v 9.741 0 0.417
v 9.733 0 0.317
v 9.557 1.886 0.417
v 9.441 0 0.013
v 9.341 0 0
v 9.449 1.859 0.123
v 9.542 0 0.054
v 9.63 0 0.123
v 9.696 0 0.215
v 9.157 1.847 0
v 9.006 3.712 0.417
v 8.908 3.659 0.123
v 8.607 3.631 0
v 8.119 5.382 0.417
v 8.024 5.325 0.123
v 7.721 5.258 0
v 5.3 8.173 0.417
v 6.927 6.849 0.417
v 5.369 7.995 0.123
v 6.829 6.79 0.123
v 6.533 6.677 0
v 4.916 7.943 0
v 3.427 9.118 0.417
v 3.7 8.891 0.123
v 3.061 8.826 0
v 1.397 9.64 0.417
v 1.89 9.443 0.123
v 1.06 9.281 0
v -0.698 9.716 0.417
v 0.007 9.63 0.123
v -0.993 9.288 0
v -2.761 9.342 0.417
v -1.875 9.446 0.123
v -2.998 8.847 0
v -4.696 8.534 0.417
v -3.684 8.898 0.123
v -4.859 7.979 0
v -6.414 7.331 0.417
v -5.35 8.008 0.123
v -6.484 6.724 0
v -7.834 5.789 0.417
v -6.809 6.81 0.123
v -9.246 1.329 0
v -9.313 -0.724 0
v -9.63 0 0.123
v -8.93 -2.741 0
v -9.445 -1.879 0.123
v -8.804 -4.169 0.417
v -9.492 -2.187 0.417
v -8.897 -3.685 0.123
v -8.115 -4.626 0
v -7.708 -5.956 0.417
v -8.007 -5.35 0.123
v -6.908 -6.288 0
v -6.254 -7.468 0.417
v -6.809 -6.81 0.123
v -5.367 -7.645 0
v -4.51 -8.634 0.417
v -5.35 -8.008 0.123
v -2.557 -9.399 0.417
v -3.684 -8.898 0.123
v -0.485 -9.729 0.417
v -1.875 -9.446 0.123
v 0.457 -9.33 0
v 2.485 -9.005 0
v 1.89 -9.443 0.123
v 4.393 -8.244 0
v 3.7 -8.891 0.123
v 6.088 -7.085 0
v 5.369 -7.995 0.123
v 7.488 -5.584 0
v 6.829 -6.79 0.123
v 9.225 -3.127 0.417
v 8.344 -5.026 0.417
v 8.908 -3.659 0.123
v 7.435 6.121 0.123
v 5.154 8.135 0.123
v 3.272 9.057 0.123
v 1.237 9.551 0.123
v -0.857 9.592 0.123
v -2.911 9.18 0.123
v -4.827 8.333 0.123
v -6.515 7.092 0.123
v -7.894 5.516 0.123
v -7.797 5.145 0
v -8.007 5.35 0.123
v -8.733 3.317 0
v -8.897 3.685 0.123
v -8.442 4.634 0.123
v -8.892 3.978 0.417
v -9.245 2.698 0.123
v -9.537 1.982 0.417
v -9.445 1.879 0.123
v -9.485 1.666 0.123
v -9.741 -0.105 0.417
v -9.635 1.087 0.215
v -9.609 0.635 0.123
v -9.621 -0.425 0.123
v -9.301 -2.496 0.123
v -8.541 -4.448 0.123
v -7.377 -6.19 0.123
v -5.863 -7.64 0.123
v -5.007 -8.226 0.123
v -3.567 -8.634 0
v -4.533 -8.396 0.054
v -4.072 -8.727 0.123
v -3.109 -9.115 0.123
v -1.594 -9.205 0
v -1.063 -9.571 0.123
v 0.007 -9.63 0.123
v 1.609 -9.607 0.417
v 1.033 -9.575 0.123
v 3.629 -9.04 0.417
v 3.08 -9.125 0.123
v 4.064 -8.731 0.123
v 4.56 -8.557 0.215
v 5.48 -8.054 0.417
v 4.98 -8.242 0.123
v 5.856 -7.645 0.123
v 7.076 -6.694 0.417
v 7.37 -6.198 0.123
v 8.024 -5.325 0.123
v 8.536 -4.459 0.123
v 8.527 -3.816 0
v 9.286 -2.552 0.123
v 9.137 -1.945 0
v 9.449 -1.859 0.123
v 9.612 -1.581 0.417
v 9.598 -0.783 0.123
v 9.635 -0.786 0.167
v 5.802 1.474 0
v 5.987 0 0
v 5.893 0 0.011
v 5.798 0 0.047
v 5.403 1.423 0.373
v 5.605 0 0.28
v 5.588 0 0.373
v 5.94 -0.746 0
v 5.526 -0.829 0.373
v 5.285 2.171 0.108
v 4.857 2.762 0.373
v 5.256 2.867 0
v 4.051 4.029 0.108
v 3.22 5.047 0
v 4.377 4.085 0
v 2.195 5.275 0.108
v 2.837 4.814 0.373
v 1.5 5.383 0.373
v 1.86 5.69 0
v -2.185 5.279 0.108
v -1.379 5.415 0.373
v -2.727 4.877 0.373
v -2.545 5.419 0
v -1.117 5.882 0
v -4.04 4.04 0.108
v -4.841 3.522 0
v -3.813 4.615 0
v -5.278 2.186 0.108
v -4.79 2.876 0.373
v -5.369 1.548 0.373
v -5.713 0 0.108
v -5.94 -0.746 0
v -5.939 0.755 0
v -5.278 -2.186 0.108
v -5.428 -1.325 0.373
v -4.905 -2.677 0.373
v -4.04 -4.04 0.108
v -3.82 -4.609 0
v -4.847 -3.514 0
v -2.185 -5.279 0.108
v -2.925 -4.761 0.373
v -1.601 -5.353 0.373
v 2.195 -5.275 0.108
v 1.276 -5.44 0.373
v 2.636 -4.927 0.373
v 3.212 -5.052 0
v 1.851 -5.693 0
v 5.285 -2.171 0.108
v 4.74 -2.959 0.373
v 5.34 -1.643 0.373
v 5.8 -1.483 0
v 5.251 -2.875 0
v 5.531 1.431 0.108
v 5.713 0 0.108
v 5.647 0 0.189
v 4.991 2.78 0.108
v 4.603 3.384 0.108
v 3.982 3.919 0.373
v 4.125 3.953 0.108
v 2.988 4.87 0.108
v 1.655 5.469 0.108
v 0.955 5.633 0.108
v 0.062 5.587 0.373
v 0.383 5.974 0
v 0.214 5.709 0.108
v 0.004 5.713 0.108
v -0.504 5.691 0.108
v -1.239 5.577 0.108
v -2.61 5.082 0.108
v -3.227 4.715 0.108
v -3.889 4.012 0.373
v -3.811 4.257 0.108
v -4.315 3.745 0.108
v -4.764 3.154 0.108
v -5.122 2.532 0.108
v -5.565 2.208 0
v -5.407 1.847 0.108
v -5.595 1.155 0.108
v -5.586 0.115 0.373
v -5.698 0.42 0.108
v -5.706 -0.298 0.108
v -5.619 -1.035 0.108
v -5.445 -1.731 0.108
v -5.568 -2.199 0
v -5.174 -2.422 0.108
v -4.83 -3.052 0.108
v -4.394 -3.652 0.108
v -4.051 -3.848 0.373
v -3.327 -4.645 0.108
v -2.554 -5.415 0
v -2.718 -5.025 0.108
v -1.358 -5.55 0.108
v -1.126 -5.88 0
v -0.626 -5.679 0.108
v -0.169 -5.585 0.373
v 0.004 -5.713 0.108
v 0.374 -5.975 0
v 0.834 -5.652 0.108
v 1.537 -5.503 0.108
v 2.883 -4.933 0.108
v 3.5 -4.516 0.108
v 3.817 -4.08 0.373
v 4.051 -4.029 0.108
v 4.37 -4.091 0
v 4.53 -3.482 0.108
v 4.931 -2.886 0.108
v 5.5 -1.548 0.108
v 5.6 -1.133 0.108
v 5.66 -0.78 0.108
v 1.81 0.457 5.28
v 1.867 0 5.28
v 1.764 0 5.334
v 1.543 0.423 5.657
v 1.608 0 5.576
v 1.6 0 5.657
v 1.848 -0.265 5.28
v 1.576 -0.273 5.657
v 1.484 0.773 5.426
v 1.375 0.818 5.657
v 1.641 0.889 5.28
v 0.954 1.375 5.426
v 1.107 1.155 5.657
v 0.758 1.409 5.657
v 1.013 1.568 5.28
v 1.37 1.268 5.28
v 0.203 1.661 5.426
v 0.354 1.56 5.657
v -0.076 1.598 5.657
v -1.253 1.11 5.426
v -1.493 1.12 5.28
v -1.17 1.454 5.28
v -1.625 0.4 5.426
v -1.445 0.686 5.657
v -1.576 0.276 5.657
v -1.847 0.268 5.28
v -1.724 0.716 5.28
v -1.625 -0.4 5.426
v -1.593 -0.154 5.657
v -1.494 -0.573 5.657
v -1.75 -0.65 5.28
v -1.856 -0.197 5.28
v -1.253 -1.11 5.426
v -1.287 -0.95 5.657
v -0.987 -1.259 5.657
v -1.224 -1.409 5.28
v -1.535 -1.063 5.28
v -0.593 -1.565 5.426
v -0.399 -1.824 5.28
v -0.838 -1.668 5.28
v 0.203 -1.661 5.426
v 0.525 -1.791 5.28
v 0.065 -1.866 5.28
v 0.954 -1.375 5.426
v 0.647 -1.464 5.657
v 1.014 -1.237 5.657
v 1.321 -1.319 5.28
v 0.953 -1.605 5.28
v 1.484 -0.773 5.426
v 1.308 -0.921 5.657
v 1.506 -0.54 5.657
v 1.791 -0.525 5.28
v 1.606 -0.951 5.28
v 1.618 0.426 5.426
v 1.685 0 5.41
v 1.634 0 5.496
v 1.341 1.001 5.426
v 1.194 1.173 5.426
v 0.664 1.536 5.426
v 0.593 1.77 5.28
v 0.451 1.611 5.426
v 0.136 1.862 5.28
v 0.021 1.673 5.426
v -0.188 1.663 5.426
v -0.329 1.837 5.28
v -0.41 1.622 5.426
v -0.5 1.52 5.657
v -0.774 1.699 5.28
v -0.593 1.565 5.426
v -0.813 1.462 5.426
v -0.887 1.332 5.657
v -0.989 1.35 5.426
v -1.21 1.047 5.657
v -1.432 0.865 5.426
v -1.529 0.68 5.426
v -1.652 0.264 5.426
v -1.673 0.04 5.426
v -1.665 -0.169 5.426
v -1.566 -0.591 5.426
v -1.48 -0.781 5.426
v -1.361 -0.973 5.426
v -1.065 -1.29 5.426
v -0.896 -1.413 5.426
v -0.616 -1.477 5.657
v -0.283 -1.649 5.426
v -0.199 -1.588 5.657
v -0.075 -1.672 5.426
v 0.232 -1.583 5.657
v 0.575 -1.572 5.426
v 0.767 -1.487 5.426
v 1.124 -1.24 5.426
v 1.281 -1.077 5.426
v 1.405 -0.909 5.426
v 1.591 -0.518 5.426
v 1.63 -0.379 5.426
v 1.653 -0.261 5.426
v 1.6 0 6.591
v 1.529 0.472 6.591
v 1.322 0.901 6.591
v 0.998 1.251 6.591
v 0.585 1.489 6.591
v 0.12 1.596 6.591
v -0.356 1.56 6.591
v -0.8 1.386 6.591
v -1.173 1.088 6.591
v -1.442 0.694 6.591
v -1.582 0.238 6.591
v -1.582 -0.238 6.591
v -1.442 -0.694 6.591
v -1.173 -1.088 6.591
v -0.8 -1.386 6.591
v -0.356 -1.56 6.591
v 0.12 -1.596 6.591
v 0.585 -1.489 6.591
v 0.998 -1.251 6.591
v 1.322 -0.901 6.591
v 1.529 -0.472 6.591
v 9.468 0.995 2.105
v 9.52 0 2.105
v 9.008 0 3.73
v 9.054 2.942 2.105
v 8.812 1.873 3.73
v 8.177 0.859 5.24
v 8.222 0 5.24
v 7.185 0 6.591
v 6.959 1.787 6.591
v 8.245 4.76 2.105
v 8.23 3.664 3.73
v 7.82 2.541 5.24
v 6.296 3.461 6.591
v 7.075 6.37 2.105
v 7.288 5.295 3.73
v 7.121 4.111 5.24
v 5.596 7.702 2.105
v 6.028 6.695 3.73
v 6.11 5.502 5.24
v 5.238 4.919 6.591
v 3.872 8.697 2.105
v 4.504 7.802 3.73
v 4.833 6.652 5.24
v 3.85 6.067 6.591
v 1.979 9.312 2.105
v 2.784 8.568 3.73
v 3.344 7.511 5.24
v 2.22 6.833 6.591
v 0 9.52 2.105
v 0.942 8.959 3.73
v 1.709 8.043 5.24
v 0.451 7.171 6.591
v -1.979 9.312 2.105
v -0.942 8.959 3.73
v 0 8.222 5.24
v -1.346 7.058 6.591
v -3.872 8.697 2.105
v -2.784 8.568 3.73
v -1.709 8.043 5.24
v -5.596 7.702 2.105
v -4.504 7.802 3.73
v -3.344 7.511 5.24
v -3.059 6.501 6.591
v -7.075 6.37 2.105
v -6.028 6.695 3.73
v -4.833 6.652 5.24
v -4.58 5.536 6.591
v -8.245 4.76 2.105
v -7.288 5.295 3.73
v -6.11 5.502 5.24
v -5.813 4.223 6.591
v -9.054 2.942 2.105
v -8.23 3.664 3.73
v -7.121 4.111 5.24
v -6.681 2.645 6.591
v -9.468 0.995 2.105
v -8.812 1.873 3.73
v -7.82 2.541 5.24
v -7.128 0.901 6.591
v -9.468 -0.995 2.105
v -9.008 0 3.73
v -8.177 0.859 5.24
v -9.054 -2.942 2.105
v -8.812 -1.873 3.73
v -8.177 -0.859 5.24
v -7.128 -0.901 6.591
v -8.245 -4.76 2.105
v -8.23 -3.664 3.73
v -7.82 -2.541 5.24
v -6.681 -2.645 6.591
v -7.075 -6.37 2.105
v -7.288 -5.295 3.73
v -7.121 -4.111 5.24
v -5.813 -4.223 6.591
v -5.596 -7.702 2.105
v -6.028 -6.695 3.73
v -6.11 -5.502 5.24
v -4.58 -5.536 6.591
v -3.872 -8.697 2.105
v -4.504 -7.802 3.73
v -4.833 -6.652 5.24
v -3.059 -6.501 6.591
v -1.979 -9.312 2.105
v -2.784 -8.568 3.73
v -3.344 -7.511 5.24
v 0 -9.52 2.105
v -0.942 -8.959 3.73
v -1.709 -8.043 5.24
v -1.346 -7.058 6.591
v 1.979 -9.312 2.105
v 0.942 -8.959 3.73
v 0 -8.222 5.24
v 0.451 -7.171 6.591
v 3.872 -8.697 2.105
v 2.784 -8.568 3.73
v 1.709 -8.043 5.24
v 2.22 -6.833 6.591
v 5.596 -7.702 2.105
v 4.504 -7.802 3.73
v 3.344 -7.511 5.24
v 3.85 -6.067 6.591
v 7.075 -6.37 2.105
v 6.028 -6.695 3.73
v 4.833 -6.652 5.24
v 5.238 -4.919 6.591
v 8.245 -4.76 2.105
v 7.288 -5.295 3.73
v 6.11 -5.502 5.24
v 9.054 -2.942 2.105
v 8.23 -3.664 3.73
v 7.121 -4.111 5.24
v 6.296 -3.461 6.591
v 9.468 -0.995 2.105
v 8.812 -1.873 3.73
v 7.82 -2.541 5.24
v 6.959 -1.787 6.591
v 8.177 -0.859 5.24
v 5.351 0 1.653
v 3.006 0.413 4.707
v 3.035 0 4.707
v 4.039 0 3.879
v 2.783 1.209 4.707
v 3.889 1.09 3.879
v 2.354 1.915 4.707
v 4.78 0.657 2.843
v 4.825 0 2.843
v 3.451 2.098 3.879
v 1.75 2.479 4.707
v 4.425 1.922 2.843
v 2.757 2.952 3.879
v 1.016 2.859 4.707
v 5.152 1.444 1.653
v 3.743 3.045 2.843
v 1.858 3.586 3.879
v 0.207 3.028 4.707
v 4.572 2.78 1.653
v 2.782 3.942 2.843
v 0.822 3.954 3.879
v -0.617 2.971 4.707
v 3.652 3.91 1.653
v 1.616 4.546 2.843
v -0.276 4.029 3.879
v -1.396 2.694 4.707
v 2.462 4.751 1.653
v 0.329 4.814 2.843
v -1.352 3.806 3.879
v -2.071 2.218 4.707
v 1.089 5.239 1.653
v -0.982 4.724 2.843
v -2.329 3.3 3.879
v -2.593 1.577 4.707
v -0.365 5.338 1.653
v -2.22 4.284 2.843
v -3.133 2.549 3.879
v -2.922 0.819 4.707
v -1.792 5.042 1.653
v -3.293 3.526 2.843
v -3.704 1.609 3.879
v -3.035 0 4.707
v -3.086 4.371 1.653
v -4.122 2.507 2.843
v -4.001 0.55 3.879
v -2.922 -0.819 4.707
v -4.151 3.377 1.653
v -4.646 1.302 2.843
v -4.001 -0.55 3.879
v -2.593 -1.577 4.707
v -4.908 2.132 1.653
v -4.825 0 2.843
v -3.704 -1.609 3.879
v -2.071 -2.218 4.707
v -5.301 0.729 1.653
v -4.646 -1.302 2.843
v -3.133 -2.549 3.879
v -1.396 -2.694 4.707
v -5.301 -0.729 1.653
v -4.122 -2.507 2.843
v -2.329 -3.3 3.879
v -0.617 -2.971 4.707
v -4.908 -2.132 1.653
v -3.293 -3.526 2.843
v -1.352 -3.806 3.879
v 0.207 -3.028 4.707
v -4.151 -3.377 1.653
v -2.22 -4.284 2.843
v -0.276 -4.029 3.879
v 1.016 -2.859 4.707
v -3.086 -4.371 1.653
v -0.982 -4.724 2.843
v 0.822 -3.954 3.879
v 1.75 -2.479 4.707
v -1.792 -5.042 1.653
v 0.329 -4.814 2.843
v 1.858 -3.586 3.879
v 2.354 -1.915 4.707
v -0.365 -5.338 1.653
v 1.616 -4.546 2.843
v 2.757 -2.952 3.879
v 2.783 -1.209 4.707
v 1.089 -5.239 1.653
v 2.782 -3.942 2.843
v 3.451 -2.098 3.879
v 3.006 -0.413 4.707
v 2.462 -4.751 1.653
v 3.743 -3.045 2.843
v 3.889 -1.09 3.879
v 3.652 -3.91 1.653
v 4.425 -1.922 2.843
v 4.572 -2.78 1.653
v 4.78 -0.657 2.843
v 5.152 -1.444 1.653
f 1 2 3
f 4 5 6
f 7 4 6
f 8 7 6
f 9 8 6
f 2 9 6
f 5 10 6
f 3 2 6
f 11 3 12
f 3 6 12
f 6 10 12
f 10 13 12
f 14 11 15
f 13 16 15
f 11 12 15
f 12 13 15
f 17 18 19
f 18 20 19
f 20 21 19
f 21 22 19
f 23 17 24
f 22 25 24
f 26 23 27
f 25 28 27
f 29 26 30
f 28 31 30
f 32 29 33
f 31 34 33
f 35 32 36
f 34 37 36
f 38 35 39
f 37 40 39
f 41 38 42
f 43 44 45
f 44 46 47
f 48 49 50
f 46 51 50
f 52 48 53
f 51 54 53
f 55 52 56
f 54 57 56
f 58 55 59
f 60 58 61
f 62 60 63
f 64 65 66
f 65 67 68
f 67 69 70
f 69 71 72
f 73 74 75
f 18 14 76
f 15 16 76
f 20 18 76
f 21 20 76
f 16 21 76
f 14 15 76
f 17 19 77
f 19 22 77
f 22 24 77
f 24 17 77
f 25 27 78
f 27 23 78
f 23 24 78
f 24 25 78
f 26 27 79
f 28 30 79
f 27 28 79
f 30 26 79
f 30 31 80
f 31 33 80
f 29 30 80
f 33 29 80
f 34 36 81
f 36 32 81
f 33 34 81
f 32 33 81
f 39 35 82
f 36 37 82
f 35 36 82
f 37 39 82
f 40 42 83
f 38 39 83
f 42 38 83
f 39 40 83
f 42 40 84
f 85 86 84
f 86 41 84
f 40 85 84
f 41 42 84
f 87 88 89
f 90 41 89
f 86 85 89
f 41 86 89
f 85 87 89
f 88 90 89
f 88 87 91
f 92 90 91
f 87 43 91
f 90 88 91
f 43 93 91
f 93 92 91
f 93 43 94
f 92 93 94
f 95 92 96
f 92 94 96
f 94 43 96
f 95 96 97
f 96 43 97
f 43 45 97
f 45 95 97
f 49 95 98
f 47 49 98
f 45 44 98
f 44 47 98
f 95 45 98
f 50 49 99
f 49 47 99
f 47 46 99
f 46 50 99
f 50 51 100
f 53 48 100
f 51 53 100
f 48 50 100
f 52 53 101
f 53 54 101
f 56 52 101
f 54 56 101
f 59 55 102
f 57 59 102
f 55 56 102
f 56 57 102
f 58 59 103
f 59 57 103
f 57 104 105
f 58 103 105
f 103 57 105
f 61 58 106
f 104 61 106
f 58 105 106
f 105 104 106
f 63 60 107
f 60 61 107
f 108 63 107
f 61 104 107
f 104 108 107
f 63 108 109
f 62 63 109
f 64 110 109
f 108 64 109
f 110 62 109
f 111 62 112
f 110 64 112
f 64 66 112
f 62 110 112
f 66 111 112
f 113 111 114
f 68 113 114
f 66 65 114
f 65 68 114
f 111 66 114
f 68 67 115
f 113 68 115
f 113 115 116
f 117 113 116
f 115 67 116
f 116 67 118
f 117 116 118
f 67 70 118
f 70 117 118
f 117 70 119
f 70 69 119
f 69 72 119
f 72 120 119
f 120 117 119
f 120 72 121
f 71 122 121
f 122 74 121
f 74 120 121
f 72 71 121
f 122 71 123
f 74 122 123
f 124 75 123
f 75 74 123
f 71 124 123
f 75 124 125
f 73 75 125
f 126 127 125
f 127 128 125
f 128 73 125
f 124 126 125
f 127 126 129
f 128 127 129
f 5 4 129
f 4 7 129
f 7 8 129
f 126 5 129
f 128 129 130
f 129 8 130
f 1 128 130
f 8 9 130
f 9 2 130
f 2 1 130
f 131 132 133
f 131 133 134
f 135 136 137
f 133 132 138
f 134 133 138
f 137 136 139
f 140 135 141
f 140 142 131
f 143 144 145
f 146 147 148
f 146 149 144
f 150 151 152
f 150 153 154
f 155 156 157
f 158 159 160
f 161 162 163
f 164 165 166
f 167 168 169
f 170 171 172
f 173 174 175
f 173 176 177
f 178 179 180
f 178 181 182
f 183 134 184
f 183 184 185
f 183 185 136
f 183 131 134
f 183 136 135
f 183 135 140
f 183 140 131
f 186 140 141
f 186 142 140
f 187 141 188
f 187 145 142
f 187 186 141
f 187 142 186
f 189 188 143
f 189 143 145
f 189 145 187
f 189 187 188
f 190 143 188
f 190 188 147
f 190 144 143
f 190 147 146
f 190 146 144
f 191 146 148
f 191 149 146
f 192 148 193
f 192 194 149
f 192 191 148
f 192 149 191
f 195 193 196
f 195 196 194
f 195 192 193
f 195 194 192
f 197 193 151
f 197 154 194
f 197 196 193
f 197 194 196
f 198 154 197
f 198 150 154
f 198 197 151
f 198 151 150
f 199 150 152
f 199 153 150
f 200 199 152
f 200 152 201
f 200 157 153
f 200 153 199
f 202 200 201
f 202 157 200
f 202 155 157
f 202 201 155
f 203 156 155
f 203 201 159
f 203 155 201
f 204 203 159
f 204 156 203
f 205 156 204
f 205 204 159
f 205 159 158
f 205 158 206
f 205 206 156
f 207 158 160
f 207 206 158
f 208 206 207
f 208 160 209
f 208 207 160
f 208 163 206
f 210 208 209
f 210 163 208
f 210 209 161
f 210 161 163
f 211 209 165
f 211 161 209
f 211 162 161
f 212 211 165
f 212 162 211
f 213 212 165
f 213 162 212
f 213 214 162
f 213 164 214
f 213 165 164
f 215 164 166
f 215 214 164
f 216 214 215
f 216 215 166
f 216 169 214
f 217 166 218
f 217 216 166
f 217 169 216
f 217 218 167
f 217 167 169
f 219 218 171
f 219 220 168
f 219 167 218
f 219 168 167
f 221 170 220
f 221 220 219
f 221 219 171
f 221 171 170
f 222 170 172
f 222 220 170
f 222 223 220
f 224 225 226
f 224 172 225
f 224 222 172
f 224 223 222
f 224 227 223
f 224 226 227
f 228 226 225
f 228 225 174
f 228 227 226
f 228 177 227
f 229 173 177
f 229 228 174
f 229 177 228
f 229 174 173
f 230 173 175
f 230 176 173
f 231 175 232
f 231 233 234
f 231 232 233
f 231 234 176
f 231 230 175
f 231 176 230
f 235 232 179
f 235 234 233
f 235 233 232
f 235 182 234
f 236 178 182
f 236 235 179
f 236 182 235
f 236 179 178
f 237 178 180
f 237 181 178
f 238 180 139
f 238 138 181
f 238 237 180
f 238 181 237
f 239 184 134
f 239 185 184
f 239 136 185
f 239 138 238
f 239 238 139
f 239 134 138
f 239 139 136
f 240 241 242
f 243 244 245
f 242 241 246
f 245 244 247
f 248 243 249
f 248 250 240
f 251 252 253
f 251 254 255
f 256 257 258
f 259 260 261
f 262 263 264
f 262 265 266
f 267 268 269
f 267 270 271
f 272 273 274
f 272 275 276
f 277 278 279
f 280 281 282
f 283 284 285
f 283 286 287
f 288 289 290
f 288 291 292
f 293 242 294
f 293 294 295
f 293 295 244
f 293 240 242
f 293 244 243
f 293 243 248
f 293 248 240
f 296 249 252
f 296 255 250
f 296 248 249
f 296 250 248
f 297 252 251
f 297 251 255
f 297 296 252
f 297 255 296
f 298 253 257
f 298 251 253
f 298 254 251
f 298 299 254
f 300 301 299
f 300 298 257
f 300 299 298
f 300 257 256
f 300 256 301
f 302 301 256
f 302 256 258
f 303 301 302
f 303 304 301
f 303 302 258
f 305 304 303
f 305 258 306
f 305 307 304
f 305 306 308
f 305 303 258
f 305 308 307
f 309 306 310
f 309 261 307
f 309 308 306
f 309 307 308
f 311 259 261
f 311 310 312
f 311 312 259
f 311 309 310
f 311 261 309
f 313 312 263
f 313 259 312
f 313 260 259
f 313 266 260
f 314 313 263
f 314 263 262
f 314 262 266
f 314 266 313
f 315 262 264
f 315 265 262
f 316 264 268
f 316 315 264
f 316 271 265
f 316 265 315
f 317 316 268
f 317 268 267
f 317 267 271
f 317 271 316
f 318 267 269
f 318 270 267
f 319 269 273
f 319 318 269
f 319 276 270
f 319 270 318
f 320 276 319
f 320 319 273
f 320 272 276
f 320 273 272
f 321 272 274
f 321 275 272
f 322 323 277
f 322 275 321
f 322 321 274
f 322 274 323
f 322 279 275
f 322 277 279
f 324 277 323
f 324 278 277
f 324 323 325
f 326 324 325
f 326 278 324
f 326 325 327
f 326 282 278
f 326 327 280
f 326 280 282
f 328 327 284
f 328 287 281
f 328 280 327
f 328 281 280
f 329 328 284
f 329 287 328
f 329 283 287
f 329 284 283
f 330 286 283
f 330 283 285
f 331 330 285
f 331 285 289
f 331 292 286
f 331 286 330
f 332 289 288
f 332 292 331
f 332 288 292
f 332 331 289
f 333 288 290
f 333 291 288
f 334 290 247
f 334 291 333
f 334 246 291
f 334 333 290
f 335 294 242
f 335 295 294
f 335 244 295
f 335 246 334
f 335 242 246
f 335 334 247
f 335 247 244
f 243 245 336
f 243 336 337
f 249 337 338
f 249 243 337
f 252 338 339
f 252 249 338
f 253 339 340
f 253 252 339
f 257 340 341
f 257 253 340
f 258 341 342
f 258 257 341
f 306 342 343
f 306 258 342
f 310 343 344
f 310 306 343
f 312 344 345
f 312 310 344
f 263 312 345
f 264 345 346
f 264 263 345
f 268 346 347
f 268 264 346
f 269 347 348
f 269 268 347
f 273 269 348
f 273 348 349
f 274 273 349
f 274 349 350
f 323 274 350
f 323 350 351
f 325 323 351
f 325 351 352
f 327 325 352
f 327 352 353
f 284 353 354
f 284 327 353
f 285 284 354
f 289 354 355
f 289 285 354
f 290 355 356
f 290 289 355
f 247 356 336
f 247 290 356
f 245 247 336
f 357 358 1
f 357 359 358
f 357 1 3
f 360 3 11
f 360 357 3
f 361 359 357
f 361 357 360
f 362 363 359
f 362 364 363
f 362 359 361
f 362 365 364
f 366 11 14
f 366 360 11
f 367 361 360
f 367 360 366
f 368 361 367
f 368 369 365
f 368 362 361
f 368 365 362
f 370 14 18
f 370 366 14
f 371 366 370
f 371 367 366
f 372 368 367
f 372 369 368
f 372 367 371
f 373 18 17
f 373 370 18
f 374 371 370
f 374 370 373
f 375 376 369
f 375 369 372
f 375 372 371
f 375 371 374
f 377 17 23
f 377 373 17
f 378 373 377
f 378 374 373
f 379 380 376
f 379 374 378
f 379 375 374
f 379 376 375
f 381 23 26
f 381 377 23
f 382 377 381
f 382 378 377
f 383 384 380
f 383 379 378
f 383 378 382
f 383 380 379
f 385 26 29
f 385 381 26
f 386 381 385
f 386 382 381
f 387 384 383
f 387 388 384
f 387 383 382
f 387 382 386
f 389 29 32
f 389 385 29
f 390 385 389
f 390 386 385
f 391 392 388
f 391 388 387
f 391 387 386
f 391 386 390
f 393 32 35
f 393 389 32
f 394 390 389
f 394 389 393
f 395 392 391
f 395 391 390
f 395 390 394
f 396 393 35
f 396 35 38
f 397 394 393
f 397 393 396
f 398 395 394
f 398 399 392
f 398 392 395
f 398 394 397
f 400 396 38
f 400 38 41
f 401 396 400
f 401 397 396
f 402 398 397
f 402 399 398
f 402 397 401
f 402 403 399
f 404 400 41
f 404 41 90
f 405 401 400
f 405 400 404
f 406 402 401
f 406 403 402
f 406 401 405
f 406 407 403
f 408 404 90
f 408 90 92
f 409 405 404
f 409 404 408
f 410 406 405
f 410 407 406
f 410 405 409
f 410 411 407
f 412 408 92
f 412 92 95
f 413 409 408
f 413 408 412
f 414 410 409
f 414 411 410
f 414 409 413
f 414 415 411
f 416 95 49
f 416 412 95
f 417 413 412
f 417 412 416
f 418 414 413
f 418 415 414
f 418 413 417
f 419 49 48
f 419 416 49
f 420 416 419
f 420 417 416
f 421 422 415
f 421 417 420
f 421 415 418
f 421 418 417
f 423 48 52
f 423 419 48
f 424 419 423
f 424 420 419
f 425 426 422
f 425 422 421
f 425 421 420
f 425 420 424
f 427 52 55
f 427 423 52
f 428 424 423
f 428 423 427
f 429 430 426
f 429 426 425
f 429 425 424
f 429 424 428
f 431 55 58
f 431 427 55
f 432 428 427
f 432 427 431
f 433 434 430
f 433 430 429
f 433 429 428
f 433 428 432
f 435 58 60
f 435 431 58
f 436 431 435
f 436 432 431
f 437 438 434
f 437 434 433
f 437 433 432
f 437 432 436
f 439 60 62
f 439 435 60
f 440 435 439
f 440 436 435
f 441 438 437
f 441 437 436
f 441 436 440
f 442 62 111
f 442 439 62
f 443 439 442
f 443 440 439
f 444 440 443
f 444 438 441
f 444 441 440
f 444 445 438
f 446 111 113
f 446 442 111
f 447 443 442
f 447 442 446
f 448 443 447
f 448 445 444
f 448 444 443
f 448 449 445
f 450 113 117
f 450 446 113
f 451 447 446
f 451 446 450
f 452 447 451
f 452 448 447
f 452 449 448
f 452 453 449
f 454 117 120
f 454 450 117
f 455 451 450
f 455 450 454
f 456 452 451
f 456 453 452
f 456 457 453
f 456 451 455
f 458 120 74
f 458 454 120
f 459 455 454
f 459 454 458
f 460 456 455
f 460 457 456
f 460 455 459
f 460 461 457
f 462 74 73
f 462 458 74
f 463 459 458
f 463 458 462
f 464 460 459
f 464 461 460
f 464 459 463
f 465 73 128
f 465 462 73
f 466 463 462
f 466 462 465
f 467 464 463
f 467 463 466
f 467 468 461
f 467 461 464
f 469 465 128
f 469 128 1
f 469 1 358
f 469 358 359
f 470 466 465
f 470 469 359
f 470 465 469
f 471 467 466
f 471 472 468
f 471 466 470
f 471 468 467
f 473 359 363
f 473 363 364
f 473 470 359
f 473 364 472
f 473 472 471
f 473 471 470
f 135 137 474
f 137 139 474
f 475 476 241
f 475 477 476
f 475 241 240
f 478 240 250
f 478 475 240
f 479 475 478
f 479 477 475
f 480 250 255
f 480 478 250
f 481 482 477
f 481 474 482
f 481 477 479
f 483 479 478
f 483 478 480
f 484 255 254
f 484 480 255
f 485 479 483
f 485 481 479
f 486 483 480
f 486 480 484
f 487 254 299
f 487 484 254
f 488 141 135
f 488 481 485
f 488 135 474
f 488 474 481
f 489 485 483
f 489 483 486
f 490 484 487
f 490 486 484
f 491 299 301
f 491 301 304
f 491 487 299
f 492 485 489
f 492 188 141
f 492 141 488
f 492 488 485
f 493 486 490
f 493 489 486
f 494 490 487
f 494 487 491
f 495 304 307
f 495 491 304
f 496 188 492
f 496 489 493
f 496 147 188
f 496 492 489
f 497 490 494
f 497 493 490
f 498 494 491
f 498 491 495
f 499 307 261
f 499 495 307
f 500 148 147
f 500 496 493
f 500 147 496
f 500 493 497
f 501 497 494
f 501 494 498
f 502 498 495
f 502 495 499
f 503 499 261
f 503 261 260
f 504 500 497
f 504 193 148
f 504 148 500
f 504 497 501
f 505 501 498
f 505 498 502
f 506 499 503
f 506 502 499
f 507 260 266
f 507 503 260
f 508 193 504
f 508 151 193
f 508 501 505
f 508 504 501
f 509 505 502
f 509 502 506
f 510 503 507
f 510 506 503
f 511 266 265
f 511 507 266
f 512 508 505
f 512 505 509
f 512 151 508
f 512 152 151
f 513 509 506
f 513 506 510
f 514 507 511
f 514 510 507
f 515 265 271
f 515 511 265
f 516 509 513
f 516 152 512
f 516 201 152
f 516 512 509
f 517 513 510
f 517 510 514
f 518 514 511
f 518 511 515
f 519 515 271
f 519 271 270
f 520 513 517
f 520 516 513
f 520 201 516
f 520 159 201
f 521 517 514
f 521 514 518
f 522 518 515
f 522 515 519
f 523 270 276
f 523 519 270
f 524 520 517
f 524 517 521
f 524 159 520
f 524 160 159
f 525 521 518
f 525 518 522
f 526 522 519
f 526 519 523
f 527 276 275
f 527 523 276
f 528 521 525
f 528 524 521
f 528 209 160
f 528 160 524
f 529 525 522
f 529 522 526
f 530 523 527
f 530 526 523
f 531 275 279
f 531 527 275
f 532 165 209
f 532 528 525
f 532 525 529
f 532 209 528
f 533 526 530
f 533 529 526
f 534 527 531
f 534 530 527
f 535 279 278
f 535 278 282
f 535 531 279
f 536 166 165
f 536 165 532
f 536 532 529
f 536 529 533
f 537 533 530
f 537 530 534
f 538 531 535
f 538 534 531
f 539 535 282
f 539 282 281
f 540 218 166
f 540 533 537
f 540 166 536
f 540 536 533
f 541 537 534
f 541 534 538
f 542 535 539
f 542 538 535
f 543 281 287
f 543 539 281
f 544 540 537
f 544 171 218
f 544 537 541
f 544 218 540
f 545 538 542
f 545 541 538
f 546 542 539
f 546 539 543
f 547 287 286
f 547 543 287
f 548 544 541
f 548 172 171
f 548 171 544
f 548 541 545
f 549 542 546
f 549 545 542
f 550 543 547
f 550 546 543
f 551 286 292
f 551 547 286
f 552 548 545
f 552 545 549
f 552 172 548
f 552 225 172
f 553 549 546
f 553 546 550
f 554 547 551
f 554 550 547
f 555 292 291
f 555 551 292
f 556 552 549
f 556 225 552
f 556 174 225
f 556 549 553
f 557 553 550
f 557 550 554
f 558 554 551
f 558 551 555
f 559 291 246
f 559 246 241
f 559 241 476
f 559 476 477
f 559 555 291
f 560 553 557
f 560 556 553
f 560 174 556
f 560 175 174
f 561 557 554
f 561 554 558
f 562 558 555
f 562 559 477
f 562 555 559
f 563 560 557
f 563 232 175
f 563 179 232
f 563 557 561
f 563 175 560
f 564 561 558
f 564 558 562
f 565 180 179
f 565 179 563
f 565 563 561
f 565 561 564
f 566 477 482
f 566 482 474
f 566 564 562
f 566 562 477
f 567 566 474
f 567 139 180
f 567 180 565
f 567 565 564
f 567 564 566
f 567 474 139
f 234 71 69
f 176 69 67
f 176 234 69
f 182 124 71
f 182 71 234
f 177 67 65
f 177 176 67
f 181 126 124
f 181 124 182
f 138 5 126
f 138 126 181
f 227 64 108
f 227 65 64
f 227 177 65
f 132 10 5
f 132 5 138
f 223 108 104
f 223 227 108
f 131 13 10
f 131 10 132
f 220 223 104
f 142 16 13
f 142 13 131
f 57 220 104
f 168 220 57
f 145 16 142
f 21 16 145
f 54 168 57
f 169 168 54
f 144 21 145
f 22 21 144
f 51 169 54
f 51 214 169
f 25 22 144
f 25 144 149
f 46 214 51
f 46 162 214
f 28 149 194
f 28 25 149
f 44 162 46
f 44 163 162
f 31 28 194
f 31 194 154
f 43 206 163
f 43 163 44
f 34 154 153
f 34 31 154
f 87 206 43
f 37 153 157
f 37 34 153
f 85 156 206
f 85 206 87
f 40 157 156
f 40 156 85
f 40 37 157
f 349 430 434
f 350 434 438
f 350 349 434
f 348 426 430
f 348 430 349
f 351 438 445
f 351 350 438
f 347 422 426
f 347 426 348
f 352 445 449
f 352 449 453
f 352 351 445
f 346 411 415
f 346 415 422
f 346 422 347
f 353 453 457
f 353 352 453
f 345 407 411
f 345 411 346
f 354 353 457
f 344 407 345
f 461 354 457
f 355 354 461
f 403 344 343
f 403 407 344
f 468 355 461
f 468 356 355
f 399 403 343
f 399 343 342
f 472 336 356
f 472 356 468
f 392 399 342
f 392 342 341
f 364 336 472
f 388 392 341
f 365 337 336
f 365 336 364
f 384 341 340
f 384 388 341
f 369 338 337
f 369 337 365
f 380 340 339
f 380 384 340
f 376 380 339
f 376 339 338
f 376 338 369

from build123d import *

# Parameters (mm, degrees)
BOTTOM_FILLET_R      = 0.4
CENTER_HOLE_FILLET_R = 0.4


with BuildPart() as part:
    # Sketch2 → Main Body (revolve)
    with BuildSketch(Plane(origin=(0, 0, 0), x_dir=(1, 0, 0), z_dir=(0, 1, 0))):
        with BuildLine():
            Line((5.6, 0), (9.75, 0))
            ThreePointArc((9.75, 0), (9.086189349, -3.536051911), (7.185146027, -6.590612761))
            Line((7.185146027, -6.590612761), (1.6, -6.590612761))
            Line((1.6, -6.590612761), (1.6, -5.366563146))
            ThreePointArc((1.6, -5.366563146), (4.489988864, -3.346640106), (5.6, 0))
        make_face()
    revolve(axis=Axis((0, 0, 0), (0, 0, 1)))

    # Bottom Fillet
    bottom_fillet_edges = [part.edges().sort_by_distance(p)[0] for p in [
        (-5.6, 0, 0),
        (-9.75, 0, 0),
    ]]
    fillet(bottom_fillet_edges, radius=BOTTOM_FILLET_R)

    # Center Hole Fillet
    center_hole_fillet_edges = [part.edges().sort_by_distance(p)[0] for p in [
        (-1.6, 0, 5.366563146),
    ]]
    fillet(center_hole_fillet_edges, radius=CENTER_HOLE_FILLET_R)


solid = part.part
